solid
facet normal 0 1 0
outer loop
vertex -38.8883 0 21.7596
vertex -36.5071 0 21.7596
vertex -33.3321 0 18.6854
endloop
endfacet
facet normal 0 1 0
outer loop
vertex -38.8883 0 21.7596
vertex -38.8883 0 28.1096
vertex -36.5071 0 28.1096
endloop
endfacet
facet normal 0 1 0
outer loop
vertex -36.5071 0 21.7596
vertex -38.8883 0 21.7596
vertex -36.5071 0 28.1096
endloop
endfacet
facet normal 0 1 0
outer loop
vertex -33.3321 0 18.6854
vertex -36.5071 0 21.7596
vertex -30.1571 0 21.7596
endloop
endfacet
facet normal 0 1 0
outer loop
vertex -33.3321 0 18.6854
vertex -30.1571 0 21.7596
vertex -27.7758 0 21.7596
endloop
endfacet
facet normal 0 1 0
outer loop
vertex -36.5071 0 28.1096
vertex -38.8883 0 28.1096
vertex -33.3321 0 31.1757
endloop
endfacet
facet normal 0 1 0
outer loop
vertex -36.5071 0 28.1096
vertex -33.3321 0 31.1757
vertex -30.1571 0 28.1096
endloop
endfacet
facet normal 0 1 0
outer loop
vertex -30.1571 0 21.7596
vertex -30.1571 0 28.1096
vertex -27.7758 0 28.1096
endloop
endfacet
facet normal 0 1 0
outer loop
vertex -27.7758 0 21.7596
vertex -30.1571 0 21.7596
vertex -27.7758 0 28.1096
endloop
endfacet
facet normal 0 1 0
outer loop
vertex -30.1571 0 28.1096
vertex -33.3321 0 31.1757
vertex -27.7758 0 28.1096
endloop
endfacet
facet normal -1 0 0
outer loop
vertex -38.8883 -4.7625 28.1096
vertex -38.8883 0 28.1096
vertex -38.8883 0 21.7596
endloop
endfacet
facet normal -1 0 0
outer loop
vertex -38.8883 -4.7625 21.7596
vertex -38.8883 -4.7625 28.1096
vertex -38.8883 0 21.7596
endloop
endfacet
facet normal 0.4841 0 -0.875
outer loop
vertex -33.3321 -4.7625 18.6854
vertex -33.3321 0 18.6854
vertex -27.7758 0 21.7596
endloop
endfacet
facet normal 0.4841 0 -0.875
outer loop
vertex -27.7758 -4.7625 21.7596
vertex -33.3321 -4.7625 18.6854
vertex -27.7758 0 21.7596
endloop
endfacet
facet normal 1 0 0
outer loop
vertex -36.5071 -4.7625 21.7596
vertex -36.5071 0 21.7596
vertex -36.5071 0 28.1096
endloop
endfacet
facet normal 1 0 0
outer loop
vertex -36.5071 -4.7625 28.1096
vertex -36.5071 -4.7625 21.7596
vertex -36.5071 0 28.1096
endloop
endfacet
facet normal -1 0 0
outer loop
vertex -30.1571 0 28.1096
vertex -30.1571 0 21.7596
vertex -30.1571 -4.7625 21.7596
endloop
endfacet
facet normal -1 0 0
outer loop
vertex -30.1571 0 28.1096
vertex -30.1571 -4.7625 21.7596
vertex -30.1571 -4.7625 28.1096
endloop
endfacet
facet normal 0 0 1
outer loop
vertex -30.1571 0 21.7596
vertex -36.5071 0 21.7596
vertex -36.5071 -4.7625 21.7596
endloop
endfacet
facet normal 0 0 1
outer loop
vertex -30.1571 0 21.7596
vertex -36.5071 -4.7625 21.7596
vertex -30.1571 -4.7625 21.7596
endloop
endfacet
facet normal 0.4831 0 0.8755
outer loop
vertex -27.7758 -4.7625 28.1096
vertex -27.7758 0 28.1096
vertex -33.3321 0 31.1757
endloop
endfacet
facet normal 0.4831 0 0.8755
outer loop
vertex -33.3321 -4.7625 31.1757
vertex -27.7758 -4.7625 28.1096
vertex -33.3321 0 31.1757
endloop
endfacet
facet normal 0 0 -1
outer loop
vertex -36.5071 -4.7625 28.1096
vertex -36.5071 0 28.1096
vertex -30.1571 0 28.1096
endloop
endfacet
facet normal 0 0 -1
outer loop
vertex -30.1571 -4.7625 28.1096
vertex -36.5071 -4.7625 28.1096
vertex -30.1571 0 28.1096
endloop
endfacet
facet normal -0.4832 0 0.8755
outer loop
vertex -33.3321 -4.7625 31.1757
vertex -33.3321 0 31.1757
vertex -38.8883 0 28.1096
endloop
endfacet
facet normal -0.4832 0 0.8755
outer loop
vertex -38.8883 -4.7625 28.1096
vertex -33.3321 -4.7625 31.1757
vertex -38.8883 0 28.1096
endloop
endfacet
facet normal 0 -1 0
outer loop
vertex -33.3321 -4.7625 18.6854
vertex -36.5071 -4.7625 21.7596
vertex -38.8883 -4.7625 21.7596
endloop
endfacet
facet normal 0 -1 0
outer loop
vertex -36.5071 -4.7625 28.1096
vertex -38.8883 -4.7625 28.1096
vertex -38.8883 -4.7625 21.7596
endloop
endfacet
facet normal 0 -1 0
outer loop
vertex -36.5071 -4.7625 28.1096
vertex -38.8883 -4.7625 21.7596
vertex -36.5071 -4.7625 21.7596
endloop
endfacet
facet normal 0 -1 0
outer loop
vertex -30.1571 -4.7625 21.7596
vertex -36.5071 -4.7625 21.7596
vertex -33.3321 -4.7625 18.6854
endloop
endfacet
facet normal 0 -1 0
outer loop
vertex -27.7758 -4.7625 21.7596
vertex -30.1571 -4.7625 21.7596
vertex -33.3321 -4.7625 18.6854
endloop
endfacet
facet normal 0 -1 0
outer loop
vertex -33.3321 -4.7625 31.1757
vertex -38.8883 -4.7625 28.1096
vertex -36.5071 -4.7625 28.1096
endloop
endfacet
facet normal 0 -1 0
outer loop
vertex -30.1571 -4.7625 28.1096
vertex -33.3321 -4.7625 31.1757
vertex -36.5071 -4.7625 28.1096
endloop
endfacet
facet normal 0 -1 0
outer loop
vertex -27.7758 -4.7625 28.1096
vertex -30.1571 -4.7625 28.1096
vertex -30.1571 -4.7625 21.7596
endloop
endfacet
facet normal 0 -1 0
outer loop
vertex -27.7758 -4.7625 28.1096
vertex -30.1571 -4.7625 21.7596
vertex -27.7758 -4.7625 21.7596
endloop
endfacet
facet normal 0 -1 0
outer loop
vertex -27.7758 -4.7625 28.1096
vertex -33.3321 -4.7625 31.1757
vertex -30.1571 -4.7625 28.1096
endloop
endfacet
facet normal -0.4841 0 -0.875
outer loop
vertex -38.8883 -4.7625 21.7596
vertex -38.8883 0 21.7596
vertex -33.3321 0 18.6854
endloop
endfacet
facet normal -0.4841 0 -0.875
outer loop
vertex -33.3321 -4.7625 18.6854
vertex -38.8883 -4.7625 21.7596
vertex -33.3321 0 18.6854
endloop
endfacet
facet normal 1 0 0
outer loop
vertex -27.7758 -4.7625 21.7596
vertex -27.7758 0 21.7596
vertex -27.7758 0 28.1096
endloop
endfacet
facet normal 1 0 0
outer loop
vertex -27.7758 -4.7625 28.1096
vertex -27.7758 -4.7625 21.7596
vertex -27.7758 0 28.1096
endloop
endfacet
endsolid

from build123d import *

# Parameters (mm, degrees)
F0_W     = 6.35
F0_H     = 6.35
F1_DEPTH = 4.7625


with BuildPart() as f1:
    # F0 (on Front) → F1 (new body)
    with BuildSketch(Plane.XZ):
        Polygon((-33.332054, 31.175699), (-38.888304, 28.109566), (-38.888304, 21.759566), (-33.332054, 18.685385), (-27.775804, 21.759566), (-27.775804, 28.109566), align=None)
        with Locations((-33.332054, 24.934566)):
            Rectangle(F0_W, F0_H, mode=Mode.SUBTRACT)
    extrude(amount=F1_DEPTH)


solid = f1.part
